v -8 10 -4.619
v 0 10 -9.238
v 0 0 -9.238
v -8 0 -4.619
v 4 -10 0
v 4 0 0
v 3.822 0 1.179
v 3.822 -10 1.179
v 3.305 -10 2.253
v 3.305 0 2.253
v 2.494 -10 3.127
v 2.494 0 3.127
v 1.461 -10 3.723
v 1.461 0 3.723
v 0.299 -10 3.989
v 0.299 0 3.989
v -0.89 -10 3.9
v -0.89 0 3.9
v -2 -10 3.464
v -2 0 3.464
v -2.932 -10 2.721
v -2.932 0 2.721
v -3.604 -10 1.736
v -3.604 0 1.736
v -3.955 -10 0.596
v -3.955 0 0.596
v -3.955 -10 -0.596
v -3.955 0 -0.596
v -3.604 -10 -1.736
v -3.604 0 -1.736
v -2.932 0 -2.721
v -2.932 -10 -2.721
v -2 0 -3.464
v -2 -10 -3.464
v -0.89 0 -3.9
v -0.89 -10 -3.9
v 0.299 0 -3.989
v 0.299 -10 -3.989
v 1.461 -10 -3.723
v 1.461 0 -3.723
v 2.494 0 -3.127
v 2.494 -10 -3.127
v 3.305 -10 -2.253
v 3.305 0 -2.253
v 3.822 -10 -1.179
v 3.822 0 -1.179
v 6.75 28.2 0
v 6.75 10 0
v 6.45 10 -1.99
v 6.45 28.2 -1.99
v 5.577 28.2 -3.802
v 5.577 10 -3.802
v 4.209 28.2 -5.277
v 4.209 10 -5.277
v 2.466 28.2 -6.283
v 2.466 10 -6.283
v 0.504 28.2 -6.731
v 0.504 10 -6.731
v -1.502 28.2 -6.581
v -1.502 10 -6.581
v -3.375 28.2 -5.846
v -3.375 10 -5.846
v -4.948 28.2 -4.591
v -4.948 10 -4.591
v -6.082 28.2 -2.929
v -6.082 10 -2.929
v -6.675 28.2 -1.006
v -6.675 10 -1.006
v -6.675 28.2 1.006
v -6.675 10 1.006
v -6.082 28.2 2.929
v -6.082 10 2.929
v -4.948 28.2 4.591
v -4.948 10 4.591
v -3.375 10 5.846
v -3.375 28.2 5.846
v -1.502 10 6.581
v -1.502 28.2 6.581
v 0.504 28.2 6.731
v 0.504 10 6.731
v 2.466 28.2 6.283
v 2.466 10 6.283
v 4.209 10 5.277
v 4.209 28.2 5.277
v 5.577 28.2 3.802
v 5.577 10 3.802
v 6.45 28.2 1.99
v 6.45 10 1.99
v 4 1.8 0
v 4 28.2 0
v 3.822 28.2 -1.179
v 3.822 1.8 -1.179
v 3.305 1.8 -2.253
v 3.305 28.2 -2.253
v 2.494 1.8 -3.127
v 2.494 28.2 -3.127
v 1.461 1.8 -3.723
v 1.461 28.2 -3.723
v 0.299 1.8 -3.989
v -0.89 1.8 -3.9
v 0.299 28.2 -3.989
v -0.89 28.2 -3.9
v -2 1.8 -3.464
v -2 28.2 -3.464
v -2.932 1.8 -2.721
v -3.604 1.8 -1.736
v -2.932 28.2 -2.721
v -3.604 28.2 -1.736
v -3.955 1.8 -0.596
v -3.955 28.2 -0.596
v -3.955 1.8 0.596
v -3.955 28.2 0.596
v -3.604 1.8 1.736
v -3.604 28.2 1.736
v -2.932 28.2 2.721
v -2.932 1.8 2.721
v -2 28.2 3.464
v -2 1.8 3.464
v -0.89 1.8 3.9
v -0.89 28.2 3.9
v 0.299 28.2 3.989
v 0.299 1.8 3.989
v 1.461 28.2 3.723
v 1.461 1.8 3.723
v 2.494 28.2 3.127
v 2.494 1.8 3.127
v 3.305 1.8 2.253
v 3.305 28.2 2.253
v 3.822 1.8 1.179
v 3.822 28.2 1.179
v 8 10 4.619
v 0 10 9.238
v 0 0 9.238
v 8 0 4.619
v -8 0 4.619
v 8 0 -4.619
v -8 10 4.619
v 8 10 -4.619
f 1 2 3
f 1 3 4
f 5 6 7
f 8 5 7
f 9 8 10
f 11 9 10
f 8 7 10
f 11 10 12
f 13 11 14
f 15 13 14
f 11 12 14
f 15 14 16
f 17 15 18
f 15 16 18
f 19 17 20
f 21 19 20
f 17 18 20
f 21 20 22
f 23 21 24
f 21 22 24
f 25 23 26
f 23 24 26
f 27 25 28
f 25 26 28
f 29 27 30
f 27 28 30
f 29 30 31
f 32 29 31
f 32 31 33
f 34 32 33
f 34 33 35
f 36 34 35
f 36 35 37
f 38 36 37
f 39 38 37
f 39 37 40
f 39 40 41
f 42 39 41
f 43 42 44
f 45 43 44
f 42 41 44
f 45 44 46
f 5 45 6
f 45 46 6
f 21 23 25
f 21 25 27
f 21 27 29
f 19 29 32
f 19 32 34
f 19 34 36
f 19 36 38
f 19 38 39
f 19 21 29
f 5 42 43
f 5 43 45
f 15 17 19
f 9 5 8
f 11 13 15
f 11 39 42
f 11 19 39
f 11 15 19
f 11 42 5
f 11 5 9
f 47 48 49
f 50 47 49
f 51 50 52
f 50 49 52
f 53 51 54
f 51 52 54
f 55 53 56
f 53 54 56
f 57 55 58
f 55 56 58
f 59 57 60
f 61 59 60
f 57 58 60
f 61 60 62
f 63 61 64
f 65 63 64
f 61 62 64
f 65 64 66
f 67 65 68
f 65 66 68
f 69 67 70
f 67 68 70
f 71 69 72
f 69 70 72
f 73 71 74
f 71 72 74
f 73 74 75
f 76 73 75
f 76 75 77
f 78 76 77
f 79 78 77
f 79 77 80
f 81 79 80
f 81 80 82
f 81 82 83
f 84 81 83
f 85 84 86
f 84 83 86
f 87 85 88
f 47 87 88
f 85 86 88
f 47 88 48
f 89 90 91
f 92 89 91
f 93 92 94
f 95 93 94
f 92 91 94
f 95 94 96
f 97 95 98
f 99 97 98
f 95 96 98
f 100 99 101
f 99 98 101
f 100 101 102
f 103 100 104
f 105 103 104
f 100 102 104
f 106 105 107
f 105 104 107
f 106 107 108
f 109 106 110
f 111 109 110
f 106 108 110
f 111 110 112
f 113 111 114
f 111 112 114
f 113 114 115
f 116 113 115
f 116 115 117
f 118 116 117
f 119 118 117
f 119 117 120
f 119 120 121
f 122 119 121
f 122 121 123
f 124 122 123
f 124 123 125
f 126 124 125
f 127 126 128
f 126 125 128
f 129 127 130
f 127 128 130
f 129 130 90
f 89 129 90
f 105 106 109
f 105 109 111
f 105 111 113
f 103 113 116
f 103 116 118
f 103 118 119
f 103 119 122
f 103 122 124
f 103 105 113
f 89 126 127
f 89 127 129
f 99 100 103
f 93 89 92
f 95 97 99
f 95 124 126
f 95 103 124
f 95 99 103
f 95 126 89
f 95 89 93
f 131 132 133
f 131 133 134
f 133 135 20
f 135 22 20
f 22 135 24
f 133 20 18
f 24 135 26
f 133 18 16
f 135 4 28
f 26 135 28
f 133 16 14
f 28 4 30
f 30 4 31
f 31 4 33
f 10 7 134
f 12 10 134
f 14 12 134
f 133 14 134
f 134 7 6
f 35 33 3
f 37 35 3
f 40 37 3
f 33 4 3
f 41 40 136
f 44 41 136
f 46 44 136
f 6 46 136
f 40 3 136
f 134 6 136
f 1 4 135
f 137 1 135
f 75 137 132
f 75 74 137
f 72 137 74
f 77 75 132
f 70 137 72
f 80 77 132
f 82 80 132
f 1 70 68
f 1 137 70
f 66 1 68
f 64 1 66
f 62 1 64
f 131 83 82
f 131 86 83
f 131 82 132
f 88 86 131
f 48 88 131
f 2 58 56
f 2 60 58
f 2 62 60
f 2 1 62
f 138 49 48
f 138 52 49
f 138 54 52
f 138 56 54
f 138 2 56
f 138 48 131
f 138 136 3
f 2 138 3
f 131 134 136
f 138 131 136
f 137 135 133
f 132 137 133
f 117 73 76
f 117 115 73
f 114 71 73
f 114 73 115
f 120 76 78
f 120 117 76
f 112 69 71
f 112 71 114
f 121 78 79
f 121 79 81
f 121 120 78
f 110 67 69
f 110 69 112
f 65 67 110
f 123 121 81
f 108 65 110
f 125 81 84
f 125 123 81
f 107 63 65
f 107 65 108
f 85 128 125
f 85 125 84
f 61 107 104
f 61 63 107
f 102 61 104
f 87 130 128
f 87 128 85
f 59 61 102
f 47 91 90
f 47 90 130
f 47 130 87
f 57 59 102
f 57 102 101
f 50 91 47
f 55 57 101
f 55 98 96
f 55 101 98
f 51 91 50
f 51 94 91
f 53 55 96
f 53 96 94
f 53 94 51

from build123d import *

# Parameters (mm, degrees)
BOSS_EXTRUDE1_DEPTH = 10
SKETCH2_R           = 6.75
BOSS_EXTRUDE2_DEPTH = 18.2
SKETCH3_R           = 4
BOSS_EXTRUDE3_DEPTH = 10
SKETCH4_R           = 4
CUT_EXTRUDE1_DEPTH  = 26.4


with BuildPart() as part:
    # Sketch1 → Boss-Extrude1 (new body)
    with BuildSketch(Plane(origin=(0, 0, 0), x_dir=(1, 0, 0), z_dir=(0, 1, 0))):
        Polygon((0, 9.237604307), (-8, 4.618802154), (-8, -4.618802154), (0, -9.237604307), (8, -4.618802154), (8, 4.618802154), align=None)
    extrude(amount=BOSS_EXTRUDE1_DEPTH)

    # Sketch2 → Boss-Extrude2 (add)
    with BuildSketch(Plane(origin=(0, 10, 0), x_dir=(1, 0, 0), z_dir=(0, 1, 0))):
        Circle(SKETCH2_R)
    extrude(amount=BOSS_EXTRUDE2_DEPTH)

    # Sketch3 → Boss-Extrude3 (add)
    with BuildSketch(Plane.XZ):
        Circle(SKETCH3_R)
    extrude(amount=BOSS_EXTRUDE3_DEPTH)

    # Sketch4 → Cut-Extrude1 (cut)
    with BuildSketch(Plane(origin=(0, 28.2, 0), x_dir=(1, 0, 0), z_dir=(0, 1, 0))):
        Circle(SKETCH4_R)
    extrude(amount=-CUT_EXTRUDE1_DEPTH, mode=Mode.SUBTRACT)


solid = part.part
